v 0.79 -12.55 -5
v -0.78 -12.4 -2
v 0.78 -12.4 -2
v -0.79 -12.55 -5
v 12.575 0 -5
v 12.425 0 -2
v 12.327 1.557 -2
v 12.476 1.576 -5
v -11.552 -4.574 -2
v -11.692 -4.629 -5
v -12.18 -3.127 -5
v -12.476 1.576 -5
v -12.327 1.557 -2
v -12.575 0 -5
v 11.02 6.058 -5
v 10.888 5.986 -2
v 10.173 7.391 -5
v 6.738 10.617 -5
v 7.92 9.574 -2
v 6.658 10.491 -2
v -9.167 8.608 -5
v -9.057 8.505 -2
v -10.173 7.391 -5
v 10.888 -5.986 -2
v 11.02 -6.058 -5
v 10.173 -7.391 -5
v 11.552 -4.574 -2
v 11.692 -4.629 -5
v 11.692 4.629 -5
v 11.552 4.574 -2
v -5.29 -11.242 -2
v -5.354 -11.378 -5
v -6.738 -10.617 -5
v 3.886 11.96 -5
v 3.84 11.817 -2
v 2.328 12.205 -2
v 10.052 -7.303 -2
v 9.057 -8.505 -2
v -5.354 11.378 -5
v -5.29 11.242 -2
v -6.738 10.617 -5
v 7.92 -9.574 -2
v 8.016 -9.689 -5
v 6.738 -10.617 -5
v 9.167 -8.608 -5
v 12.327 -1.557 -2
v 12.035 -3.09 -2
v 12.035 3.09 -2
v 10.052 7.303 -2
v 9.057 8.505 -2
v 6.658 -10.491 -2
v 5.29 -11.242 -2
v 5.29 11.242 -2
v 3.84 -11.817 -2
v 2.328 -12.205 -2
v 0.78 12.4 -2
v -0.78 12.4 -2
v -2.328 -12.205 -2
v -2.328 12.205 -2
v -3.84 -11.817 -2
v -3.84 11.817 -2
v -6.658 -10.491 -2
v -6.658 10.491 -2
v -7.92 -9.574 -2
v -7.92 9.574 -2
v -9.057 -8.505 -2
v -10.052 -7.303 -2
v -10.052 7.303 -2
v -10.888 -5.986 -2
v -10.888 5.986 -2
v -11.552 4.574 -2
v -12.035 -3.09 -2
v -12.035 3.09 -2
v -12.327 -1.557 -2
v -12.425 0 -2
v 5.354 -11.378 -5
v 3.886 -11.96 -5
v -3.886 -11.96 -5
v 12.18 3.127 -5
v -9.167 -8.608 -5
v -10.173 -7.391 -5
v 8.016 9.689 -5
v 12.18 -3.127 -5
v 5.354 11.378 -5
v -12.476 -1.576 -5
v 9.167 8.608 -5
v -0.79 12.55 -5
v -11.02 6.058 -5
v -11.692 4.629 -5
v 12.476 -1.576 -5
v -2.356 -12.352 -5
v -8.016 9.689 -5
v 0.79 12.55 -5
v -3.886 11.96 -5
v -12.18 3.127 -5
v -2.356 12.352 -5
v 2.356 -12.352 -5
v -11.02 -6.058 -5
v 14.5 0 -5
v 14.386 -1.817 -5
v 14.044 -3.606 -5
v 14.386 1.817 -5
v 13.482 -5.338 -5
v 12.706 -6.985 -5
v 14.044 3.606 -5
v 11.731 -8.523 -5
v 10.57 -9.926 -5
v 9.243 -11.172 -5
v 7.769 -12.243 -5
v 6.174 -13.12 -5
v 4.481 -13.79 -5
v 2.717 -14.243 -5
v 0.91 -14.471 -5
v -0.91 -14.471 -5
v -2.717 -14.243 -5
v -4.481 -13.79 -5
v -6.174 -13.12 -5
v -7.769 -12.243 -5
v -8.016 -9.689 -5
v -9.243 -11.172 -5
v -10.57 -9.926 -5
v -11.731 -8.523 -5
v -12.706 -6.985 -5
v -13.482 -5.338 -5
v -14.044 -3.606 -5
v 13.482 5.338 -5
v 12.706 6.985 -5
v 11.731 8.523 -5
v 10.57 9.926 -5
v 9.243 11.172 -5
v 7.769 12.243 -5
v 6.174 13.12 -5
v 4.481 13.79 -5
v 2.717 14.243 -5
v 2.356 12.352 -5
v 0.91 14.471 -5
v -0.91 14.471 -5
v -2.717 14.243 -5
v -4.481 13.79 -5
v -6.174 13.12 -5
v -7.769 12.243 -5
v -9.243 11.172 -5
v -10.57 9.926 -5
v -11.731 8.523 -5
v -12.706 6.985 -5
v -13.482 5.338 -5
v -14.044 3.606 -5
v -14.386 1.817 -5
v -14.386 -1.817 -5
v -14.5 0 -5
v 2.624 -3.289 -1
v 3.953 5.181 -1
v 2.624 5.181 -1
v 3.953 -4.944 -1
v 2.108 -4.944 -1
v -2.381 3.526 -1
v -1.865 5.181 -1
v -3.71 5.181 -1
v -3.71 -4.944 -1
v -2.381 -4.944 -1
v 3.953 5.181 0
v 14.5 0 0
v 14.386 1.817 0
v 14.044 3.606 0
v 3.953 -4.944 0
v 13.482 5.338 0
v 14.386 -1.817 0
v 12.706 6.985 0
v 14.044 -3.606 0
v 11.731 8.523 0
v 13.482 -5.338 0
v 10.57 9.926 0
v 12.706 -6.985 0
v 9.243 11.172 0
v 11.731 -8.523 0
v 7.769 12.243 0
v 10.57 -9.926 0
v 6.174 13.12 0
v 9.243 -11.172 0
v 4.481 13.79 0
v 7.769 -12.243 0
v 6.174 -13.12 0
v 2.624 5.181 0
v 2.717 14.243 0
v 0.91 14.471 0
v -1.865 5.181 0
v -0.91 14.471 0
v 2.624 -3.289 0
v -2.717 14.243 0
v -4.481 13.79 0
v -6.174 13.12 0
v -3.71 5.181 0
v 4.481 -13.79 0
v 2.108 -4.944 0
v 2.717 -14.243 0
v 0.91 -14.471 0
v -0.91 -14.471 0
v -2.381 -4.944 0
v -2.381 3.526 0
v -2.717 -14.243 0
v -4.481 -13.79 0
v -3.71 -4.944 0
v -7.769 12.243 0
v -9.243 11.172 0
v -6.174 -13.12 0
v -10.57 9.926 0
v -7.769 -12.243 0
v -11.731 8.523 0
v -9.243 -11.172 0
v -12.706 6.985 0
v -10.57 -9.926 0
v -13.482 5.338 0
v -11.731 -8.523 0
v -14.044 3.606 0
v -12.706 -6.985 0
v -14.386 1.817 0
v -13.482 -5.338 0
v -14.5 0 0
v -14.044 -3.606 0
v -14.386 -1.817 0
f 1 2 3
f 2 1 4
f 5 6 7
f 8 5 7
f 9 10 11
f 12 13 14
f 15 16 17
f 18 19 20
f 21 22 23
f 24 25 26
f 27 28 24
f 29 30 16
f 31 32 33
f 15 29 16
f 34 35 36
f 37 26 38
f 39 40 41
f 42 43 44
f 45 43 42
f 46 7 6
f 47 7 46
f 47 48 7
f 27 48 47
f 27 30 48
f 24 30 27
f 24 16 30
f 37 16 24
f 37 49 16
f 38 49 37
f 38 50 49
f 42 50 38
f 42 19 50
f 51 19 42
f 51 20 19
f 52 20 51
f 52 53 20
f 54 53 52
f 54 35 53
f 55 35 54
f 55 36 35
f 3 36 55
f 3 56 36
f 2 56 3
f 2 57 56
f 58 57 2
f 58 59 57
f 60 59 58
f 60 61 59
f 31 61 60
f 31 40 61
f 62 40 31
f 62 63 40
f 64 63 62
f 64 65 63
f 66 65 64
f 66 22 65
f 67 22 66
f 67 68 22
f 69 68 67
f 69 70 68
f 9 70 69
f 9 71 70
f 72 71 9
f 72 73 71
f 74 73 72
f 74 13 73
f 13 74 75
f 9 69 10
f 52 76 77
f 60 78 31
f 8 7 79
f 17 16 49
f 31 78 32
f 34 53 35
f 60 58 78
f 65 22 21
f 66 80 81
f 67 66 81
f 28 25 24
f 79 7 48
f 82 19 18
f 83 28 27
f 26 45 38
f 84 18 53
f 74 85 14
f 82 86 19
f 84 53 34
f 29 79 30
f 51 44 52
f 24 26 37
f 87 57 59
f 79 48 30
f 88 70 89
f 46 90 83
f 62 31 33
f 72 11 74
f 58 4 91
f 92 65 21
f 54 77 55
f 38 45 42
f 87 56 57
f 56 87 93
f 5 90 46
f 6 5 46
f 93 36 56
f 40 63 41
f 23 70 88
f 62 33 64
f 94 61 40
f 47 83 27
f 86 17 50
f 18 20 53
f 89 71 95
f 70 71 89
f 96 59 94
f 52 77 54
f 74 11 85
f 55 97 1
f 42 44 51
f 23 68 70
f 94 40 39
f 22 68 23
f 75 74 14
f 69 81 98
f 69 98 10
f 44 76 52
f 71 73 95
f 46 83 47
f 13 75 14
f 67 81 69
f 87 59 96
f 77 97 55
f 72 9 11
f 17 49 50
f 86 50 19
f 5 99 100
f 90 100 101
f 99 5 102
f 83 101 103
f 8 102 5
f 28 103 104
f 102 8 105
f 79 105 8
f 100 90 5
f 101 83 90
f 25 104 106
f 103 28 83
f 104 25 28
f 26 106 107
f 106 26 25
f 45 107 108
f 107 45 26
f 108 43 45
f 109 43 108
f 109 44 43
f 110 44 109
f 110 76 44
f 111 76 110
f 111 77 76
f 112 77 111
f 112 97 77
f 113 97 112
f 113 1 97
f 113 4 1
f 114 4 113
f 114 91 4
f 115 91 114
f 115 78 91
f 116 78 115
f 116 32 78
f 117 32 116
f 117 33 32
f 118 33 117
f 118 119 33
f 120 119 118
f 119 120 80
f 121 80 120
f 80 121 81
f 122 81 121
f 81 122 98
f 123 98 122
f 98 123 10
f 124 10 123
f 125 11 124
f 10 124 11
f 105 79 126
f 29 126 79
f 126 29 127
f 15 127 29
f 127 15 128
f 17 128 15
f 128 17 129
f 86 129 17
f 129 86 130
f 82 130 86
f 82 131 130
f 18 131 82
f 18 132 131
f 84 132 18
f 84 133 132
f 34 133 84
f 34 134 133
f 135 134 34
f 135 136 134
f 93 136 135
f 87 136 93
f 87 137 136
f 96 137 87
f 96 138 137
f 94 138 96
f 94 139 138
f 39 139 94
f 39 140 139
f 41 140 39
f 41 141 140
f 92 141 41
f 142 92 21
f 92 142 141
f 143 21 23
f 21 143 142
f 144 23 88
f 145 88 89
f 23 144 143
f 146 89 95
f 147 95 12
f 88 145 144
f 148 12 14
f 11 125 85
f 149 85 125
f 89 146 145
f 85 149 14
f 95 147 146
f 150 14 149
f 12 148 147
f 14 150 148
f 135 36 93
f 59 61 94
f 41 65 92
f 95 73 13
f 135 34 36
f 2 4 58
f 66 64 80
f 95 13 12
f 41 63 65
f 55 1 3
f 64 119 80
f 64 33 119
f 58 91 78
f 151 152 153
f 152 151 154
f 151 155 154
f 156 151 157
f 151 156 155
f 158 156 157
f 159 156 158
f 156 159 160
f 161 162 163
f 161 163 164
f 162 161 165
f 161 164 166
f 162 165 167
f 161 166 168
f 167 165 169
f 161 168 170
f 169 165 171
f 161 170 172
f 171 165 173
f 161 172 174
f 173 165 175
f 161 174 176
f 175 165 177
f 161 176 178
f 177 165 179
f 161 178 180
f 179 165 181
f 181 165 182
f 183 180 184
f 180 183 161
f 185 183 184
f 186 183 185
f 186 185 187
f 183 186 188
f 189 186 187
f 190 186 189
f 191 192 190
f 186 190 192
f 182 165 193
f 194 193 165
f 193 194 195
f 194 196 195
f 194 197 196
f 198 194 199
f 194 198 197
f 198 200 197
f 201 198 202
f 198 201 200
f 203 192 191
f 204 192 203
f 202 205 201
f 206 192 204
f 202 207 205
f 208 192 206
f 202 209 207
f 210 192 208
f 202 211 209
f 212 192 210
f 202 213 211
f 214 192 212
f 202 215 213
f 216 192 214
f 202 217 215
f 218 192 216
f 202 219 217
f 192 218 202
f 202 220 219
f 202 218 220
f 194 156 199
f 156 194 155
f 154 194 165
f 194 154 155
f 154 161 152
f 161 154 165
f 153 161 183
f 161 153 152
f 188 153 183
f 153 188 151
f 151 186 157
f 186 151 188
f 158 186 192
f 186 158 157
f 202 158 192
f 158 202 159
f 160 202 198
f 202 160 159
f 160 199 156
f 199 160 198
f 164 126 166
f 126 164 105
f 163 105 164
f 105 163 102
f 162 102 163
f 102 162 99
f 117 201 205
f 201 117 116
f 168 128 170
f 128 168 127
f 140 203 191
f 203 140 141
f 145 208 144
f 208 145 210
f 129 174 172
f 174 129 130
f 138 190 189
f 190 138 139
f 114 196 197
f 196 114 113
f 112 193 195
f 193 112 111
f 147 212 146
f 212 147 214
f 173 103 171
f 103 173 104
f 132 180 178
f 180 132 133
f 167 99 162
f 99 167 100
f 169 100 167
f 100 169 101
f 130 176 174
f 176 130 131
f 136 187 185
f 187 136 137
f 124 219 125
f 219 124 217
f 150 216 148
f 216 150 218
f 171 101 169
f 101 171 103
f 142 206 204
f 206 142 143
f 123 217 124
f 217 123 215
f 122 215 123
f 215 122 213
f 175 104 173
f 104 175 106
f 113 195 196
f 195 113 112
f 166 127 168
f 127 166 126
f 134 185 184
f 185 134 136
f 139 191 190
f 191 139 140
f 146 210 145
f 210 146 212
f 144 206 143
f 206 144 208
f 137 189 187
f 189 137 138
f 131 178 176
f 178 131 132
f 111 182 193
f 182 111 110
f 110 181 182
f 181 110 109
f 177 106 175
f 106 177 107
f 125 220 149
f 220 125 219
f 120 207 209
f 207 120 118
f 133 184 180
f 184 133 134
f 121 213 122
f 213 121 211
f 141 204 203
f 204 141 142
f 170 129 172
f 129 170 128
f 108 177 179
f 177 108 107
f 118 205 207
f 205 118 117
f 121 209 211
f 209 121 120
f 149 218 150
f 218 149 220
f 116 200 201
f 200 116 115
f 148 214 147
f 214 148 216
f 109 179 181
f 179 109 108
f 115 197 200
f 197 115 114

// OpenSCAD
$fn = 50;

difference() {
	union() {
		translate(v = [0, 0, -5.0]) {
			cylinder(h = 5, r = 14.5);
		}
	}
	union() {
		#translate(v = [0, 0, -5.0]) {
			cylinder(h = 3, r1 = 12.575, r2 = 12.425);
		}
		translate(v = [0, 0, -1]) {
			linear_extrude(height = 1) {
				text(font = "Impact", halign = "center", size = 10, text = "N", valign = "center");
			}
		}
	}
}
